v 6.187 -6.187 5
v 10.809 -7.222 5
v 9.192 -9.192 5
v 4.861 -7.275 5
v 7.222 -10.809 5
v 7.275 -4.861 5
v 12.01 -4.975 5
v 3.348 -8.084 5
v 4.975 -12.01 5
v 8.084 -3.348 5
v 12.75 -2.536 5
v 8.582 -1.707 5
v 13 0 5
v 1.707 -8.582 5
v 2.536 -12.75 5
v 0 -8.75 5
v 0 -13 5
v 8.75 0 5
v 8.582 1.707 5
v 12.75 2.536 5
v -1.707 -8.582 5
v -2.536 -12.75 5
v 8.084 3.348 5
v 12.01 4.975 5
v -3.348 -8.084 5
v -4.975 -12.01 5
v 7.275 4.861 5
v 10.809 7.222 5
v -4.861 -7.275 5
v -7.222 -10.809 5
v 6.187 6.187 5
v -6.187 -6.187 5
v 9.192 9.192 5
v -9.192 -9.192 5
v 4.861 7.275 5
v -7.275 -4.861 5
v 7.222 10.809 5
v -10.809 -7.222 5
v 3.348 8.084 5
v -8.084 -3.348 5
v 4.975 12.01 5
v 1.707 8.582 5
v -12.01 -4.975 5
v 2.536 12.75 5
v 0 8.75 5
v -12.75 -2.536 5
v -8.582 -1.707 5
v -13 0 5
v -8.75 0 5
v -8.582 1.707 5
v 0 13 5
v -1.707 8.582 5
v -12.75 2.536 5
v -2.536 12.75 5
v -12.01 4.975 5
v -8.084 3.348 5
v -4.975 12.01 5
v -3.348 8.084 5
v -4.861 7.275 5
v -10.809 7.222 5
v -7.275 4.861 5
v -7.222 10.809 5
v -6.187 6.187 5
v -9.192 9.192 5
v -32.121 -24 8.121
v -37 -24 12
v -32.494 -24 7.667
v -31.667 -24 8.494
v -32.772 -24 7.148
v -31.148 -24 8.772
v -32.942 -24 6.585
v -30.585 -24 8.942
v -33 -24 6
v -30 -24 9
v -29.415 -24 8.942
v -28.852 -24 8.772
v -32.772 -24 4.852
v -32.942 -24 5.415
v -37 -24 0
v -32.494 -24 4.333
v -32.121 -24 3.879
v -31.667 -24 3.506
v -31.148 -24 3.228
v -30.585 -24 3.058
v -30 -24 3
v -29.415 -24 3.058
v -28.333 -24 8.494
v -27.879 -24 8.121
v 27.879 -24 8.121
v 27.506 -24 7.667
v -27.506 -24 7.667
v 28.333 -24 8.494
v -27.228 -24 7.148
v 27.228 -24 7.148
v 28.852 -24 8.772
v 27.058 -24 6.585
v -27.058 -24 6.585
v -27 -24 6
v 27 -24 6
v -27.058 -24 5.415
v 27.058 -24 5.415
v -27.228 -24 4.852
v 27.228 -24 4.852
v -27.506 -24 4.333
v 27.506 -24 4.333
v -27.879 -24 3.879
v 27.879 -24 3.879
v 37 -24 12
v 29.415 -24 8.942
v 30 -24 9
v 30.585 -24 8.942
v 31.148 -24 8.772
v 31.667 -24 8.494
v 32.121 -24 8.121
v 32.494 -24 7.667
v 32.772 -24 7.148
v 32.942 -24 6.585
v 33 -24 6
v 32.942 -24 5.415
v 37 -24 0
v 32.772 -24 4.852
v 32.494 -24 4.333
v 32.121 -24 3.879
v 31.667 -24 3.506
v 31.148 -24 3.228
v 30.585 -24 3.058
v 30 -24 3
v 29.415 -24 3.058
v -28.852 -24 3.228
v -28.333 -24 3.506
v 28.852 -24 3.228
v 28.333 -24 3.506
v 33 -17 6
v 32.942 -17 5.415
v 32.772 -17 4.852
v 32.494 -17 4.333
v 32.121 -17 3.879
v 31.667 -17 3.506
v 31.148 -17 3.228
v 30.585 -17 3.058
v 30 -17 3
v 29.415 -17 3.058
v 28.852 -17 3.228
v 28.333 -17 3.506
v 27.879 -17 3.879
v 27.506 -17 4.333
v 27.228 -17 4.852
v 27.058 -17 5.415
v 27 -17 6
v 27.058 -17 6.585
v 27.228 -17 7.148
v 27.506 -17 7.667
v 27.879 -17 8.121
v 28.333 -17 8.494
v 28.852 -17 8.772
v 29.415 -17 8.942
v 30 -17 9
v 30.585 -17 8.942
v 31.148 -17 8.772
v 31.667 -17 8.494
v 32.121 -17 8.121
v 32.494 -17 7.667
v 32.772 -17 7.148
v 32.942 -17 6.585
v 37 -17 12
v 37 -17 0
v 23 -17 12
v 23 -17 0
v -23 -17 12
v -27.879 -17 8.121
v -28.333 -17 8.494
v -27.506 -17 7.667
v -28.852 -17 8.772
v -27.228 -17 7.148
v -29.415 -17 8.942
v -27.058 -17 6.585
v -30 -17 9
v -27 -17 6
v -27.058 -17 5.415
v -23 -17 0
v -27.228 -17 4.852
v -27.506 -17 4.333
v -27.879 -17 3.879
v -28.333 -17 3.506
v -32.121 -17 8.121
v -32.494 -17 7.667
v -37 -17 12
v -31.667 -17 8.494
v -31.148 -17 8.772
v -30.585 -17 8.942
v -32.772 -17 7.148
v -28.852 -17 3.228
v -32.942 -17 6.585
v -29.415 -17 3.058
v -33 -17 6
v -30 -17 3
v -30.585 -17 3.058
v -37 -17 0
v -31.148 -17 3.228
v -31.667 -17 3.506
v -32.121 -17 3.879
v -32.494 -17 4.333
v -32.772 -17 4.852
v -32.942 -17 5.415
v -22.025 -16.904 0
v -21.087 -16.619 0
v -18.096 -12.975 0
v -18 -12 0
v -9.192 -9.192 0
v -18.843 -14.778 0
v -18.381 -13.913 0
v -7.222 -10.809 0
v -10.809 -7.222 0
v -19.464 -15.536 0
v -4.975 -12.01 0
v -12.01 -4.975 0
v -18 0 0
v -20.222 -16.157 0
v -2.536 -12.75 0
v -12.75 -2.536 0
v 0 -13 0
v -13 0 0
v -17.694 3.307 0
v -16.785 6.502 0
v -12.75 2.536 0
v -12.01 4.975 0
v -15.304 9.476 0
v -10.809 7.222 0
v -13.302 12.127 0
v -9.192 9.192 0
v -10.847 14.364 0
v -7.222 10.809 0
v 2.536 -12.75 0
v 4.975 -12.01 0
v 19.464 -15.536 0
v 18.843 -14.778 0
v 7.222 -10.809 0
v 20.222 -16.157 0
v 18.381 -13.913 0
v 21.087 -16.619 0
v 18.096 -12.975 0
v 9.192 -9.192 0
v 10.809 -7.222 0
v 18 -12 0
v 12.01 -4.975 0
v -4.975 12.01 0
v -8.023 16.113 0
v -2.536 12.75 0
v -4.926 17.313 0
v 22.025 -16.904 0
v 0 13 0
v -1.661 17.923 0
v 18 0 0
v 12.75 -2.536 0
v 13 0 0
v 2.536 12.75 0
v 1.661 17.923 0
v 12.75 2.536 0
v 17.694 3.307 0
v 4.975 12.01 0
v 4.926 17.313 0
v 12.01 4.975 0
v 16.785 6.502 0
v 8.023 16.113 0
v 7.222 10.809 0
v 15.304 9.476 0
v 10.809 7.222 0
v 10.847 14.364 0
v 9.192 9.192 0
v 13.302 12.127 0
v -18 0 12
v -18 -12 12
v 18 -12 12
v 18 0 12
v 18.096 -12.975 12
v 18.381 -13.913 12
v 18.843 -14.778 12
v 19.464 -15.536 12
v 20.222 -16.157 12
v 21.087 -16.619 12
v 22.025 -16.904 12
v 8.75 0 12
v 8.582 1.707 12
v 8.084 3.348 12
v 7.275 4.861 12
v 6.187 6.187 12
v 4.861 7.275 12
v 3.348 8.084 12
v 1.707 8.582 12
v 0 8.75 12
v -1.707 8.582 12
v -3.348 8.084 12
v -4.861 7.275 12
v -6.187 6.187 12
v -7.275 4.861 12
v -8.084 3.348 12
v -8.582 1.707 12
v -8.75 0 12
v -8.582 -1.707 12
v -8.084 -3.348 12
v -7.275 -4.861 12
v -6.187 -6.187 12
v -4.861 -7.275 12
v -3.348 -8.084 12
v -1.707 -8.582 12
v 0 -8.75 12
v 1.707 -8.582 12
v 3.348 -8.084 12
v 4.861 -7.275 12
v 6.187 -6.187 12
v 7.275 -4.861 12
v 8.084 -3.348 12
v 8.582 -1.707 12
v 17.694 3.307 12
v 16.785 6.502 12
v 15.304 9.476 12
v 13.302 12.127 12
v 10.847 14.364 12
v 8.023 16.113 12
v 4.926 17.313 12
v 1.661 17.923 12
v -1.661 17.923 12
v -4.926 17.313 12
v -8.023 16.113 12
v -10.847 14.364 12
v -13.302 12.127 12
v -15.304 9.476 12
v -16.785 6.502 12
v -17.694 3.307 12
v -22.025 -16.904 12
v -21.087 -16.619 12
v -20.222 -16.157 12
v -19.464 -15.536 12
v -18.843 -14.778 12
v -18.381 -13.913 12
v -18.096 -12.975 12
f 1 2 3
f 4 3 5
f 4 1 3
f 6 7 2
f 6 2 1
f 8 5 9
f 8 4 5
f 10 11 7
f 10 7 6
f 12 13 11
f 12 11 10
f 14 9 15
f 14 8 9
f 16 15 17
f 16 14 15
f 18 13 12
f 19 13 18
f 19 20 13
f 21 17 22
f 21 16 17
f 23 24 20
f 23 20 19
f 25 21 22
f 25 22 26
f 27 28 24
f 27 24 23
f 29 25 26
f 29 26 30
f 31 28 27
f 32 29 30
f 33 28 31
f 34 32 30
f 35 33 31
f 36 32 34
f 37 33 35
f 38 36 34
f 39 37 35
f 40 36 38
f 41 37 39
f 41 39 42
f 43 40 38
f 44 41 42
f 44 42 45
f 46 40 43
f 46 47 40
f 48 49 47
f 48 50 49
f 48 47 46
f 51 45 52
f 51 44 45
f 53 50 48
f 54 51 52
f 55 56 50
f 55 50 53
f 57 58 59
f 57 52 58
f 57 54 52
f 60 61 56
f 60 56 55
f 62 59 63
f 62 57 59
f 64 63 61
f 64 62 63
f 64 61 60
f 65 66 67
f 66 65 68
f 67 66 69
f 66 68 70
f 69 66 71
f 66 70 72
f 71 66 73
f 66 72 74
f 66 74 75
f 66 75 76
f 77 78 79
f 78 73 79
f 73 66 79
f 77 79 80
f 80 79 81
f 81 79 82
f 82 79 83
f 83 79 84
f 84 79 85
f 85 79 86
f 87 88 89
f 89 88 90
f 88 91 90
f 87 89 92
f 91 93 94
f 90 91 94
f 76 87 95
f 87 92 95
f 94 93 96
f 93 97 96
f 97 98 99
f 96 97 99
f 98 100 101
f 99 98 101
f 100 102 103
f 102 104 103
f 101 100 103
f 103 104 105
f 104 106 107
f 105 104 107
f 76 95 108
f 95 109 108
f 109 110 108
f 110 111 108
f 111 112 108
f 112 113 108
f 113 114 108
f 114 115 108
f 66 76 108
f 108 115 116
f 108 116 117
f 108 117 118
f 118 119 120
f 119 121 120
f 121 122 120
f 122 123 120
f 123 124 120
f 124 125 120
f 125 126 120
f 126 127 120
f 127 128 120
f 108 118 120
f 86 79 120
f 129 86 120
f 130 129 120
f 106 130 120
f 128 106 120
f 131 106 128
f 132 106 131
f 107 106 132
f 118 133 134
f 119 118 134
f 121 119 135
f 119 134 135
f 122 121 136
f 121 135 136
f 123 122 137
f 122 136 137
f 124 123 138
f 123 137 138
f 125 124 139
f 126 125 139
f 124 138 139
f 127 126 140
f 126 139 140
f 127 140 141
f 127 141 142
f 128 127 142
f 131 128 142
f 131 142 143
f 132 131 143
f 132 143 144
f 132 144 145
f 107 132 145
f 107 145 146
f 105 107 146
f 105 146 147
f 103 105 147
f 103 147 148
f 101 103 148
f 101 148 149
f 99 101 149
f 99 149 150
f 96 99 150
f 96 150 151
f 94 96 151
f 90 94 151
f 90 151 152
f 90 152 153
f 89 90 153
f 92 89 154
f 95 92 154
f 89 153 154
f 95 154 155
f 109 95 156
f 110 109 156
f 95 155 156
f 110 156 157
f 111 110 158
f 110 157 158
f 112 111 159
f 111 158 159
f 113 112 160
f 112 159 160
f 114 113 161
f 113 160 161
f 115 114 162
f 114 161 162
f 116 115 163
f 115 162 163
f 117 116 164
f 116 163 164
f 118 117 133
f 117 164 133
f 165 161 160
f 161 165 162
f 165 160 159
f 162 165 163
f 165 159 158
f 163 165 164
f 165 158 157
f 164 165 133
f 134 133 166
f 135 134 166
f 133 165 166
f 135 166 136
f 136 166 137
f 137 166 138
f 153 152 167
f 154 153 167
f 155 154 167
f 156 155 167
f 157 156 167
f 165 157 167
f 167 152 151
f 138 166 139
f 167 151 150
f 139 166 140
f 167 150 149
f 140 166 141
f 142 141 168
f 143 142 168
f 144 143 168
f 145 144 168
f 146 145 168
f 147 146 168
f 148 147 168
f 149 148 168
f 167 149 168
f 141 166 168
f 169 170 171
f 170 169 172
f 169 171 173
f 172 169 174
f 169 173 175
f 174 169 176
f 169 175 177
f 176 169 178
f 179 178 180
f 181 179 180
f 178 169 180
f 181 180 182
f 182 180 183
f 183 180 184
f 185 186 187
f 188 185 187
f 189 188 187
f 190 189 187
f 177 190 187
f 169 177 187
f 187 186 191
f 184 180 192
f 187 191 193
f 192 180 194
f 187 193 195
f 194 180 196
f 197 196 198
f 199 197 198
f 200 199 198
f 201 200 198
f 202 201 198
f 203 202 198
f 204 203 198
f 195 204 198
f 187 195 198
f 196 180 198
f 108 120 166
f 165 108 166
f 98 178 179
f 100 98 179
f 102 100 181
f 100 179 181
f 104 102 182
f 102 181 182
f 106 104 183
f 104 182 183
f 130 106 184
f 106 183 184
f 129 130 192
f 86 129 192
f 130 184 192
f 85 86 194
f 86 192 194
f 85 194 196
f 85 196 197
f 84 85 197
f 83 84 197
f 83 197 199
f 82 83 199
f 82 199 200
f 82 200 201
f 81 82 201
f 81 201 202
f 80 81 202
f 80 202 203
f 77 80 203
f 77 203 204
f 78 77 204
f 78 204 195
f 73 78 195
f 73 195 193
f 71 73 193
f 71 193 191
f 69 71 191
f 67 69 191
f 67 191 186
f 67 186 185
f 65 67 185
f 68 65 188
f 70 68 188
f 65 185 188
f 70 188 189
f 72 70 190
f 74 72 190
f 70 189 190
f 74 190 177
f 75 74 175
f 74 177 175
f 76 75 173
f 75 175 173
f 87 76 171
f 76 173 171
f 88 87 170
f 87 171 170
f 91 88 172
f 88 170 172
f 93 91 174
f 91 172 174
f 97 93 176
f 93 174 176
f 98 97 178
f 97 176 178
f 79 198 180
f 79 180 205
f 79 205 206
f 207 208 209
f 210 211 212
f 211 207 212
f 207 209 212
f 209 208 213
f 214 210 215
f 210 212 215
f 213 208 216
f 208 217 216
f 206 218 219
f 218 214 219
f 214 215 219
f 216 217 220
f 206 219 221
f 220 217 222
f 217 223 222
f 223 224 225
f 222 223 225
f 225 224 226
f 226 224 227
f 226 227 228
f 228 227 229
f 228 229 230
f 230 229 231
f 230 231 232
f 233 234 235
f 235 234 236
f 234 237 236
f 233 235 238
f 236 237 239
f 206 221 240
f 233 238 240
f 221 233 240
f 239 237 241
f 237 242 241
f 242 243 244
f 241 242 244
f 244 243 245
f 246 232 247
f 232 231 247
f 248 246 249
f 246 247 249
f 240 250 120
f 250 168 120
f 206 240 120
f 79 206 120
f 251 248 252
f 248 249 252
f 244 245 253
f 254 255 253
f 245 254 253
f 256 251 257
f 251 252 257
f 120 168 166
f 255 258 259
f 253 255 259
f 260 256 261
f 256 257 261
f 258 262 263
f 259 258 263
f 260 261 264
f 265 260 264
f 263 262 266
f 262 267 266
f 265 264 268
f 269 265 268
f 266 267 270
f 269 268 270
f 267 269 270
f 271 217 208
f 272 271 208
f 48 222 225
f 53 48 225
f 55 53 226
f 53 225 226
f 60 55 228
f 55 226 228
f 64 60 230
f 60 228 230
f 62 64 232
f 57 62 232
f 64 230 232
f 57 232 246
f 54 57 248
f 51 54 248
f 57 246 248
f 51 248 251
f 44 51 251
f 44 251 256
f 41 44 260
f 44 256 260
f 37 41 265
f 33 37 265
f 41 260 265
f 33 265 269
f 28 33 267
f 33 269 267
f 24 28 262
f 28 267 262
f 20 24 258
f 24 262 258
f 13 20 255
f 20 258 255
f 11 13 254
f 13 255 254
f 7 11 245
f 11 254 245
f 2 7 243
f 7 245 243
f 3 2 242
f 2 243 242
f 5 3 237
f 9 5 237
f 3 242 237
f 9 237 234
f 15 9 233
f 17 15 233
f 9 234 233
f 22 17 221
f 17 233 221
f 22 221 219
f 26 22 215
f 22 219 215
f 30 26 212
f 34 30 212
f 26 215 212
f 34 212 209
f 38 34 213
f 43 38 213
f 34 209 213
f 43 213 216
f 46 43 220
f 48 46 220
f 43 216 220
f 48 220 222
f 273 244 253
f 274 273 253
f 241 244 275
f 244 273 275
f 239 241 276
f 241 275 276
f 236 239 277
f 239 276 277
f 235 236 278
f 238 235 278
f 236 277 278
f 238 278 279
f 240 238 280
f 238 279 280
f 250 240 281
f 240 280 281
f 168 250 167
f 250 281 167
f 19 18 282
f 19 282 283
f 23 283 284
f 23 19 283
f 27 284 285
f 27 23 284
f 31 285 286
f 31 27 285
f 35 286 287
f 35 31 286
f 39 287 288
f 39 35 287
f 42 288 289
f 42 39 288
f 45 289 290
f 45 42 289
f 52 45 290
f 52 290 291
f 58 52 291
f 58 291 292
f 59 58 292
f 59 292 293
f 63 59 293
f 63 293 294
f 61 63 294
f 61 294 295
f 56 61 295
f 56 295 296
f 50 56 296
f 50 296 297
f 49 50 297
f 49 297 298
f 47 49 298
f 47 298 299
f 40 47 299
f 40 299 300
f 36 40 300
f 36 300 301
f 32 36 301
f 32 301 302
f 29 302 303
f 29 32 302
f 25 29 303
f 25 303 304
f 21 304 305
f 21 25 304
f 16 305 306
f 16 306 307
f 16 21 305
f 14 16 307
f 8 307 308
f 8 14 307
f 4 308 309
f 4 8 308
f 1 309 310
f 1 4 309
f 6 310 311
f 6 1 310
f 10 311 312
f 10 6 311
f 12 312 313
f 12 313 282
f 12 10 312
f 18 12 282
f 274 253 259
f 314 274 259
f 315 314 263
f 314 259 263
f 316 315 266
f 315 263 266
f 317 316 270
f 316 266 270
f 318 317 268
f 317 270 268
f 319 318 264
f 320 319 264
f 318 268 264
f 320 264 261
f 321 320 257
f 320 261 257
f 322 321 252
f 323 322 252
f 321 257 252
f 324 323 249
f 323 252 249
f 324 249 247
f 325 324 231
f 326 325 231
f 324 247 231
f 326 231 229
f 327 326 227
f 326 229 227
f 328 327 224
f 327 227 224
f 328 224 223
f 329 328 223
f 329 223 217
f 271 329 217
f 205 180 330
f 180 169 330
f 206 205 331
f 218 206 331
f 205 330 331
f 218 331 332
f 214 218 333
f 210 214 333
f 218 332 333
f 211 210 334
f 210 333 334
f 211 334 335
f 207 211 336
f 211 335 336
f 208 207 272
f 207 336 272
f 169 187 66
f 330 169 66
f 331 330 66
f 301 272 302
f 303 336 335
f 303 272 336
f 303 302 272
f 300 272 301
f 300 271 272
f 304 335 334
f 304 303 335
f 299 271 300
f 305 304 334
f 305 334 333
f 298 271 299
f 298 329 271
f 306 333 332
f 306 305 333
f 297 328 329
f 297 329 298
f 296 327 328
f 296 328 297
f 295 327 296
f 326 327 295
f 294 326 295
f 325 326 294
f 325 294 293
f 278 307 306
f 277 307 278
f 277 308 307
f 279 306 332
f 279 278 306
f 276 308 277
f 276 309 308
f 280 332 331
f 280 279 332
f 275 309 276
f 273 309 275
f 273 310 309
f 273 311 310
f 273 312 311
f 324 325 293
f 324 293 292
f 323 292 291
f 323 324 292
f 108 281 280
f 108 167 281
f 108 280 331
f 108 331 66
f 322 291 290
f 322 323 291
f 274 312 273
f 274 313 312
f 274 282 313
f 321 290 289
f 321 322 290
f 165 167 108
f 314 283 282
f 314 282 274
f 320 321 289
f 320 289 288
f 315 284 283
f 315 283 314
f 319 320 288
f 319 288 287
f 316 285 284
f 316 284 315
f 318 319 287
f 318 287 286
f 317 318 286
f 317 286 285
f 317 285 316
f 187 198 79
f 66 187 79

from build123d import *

# Parameters (mm, degrees)
SKETCH1_R           = 8.75
BOSS_EXTRUDE1_DEPTH = 12
SKETCH2_R           = 3
CUT_EXTRUDE1_DEPTH  = 8
SKETCH3_R           = 13
CUT_EXTRUDE2_DEPTH  = 5
BOSS_EXTRUDE2_DEPTH = 12
FILLET2_R           = 5


with BuildPart() as part:
    # Sketch1 → Boss-Extrude1 (new body)
    with BuildSketch(Plane.XY):
        with BuildLine():
            Line((-5.916079783, -17), (-37, -17))
            Line((-37, -17), (-37, -24))
            Line((-37, -24), (0, -24))
            Line((0, -24), (37, -24))
            Line((37, -24), (37, -17))
            Line((37, -17), (5.916079783, -17))
            ThreePointArc((5.916079783, -17), (0, 18), (-5.916079783, -17))
        make_face()
        Circle(SKETCH1_R, mode=Mode.SUBTRACT)
    extrude(amount=BOSS_EXTRUDE1_DEPTH)

    # Sketch2 → Cut-Extrude1 (cut, through all)
    with BuildSketch(Plane(origin=(0, -17, 0), x_dir=(1, 0, 0), z_dir=(0, 1, 0))):
        with Locations((30, -6)):
            Circle(SKETCH2_R)
        with Locations((-30, -6)):
            Circle(SKETCH2_R)
    extrude(amount=-CUT_EXTRUDE1_DEPTH, mode=Mode.SUBTRACT)

    # Sketch3 → Cut-Extrude2 (cut)
    with BuildSketch(Plane(origin=(0, 0, 0), x_dir=(-1, 0, 0), z_dir=(0, 0, -1))):
        Circle(SKETCH3_R)
    extrude(amount=-CUT_EXTRUDE2_DEPTH, mode=Mode.SUBTRACT)

    # Sketch4 → Boss-Extrude2 (add, through all)
    with BuildSketch(Plane(origin=(0, 0, 0), x_dir=(-1, 0, 0), z_dir=(0, 0, -1))):
        Polygon((-18, 0), (-5.916079783, -17), (-18, -17), align=None)
        Polygon((18, 0), (18, -17), (5.916079783, -17), align=None)
    extrude(amount=-BOSS_EXTRUDE2_DEPTH)

    # Fillet2
    fillet2_edges = [part.edges().sort_by_distance(p)[0] for p in [
        (-18, -17, 6),
        (18, -17, 6),
    ]]
    fillet(fillet2_edges, radius=FILLET2_R)


solid = part.part
